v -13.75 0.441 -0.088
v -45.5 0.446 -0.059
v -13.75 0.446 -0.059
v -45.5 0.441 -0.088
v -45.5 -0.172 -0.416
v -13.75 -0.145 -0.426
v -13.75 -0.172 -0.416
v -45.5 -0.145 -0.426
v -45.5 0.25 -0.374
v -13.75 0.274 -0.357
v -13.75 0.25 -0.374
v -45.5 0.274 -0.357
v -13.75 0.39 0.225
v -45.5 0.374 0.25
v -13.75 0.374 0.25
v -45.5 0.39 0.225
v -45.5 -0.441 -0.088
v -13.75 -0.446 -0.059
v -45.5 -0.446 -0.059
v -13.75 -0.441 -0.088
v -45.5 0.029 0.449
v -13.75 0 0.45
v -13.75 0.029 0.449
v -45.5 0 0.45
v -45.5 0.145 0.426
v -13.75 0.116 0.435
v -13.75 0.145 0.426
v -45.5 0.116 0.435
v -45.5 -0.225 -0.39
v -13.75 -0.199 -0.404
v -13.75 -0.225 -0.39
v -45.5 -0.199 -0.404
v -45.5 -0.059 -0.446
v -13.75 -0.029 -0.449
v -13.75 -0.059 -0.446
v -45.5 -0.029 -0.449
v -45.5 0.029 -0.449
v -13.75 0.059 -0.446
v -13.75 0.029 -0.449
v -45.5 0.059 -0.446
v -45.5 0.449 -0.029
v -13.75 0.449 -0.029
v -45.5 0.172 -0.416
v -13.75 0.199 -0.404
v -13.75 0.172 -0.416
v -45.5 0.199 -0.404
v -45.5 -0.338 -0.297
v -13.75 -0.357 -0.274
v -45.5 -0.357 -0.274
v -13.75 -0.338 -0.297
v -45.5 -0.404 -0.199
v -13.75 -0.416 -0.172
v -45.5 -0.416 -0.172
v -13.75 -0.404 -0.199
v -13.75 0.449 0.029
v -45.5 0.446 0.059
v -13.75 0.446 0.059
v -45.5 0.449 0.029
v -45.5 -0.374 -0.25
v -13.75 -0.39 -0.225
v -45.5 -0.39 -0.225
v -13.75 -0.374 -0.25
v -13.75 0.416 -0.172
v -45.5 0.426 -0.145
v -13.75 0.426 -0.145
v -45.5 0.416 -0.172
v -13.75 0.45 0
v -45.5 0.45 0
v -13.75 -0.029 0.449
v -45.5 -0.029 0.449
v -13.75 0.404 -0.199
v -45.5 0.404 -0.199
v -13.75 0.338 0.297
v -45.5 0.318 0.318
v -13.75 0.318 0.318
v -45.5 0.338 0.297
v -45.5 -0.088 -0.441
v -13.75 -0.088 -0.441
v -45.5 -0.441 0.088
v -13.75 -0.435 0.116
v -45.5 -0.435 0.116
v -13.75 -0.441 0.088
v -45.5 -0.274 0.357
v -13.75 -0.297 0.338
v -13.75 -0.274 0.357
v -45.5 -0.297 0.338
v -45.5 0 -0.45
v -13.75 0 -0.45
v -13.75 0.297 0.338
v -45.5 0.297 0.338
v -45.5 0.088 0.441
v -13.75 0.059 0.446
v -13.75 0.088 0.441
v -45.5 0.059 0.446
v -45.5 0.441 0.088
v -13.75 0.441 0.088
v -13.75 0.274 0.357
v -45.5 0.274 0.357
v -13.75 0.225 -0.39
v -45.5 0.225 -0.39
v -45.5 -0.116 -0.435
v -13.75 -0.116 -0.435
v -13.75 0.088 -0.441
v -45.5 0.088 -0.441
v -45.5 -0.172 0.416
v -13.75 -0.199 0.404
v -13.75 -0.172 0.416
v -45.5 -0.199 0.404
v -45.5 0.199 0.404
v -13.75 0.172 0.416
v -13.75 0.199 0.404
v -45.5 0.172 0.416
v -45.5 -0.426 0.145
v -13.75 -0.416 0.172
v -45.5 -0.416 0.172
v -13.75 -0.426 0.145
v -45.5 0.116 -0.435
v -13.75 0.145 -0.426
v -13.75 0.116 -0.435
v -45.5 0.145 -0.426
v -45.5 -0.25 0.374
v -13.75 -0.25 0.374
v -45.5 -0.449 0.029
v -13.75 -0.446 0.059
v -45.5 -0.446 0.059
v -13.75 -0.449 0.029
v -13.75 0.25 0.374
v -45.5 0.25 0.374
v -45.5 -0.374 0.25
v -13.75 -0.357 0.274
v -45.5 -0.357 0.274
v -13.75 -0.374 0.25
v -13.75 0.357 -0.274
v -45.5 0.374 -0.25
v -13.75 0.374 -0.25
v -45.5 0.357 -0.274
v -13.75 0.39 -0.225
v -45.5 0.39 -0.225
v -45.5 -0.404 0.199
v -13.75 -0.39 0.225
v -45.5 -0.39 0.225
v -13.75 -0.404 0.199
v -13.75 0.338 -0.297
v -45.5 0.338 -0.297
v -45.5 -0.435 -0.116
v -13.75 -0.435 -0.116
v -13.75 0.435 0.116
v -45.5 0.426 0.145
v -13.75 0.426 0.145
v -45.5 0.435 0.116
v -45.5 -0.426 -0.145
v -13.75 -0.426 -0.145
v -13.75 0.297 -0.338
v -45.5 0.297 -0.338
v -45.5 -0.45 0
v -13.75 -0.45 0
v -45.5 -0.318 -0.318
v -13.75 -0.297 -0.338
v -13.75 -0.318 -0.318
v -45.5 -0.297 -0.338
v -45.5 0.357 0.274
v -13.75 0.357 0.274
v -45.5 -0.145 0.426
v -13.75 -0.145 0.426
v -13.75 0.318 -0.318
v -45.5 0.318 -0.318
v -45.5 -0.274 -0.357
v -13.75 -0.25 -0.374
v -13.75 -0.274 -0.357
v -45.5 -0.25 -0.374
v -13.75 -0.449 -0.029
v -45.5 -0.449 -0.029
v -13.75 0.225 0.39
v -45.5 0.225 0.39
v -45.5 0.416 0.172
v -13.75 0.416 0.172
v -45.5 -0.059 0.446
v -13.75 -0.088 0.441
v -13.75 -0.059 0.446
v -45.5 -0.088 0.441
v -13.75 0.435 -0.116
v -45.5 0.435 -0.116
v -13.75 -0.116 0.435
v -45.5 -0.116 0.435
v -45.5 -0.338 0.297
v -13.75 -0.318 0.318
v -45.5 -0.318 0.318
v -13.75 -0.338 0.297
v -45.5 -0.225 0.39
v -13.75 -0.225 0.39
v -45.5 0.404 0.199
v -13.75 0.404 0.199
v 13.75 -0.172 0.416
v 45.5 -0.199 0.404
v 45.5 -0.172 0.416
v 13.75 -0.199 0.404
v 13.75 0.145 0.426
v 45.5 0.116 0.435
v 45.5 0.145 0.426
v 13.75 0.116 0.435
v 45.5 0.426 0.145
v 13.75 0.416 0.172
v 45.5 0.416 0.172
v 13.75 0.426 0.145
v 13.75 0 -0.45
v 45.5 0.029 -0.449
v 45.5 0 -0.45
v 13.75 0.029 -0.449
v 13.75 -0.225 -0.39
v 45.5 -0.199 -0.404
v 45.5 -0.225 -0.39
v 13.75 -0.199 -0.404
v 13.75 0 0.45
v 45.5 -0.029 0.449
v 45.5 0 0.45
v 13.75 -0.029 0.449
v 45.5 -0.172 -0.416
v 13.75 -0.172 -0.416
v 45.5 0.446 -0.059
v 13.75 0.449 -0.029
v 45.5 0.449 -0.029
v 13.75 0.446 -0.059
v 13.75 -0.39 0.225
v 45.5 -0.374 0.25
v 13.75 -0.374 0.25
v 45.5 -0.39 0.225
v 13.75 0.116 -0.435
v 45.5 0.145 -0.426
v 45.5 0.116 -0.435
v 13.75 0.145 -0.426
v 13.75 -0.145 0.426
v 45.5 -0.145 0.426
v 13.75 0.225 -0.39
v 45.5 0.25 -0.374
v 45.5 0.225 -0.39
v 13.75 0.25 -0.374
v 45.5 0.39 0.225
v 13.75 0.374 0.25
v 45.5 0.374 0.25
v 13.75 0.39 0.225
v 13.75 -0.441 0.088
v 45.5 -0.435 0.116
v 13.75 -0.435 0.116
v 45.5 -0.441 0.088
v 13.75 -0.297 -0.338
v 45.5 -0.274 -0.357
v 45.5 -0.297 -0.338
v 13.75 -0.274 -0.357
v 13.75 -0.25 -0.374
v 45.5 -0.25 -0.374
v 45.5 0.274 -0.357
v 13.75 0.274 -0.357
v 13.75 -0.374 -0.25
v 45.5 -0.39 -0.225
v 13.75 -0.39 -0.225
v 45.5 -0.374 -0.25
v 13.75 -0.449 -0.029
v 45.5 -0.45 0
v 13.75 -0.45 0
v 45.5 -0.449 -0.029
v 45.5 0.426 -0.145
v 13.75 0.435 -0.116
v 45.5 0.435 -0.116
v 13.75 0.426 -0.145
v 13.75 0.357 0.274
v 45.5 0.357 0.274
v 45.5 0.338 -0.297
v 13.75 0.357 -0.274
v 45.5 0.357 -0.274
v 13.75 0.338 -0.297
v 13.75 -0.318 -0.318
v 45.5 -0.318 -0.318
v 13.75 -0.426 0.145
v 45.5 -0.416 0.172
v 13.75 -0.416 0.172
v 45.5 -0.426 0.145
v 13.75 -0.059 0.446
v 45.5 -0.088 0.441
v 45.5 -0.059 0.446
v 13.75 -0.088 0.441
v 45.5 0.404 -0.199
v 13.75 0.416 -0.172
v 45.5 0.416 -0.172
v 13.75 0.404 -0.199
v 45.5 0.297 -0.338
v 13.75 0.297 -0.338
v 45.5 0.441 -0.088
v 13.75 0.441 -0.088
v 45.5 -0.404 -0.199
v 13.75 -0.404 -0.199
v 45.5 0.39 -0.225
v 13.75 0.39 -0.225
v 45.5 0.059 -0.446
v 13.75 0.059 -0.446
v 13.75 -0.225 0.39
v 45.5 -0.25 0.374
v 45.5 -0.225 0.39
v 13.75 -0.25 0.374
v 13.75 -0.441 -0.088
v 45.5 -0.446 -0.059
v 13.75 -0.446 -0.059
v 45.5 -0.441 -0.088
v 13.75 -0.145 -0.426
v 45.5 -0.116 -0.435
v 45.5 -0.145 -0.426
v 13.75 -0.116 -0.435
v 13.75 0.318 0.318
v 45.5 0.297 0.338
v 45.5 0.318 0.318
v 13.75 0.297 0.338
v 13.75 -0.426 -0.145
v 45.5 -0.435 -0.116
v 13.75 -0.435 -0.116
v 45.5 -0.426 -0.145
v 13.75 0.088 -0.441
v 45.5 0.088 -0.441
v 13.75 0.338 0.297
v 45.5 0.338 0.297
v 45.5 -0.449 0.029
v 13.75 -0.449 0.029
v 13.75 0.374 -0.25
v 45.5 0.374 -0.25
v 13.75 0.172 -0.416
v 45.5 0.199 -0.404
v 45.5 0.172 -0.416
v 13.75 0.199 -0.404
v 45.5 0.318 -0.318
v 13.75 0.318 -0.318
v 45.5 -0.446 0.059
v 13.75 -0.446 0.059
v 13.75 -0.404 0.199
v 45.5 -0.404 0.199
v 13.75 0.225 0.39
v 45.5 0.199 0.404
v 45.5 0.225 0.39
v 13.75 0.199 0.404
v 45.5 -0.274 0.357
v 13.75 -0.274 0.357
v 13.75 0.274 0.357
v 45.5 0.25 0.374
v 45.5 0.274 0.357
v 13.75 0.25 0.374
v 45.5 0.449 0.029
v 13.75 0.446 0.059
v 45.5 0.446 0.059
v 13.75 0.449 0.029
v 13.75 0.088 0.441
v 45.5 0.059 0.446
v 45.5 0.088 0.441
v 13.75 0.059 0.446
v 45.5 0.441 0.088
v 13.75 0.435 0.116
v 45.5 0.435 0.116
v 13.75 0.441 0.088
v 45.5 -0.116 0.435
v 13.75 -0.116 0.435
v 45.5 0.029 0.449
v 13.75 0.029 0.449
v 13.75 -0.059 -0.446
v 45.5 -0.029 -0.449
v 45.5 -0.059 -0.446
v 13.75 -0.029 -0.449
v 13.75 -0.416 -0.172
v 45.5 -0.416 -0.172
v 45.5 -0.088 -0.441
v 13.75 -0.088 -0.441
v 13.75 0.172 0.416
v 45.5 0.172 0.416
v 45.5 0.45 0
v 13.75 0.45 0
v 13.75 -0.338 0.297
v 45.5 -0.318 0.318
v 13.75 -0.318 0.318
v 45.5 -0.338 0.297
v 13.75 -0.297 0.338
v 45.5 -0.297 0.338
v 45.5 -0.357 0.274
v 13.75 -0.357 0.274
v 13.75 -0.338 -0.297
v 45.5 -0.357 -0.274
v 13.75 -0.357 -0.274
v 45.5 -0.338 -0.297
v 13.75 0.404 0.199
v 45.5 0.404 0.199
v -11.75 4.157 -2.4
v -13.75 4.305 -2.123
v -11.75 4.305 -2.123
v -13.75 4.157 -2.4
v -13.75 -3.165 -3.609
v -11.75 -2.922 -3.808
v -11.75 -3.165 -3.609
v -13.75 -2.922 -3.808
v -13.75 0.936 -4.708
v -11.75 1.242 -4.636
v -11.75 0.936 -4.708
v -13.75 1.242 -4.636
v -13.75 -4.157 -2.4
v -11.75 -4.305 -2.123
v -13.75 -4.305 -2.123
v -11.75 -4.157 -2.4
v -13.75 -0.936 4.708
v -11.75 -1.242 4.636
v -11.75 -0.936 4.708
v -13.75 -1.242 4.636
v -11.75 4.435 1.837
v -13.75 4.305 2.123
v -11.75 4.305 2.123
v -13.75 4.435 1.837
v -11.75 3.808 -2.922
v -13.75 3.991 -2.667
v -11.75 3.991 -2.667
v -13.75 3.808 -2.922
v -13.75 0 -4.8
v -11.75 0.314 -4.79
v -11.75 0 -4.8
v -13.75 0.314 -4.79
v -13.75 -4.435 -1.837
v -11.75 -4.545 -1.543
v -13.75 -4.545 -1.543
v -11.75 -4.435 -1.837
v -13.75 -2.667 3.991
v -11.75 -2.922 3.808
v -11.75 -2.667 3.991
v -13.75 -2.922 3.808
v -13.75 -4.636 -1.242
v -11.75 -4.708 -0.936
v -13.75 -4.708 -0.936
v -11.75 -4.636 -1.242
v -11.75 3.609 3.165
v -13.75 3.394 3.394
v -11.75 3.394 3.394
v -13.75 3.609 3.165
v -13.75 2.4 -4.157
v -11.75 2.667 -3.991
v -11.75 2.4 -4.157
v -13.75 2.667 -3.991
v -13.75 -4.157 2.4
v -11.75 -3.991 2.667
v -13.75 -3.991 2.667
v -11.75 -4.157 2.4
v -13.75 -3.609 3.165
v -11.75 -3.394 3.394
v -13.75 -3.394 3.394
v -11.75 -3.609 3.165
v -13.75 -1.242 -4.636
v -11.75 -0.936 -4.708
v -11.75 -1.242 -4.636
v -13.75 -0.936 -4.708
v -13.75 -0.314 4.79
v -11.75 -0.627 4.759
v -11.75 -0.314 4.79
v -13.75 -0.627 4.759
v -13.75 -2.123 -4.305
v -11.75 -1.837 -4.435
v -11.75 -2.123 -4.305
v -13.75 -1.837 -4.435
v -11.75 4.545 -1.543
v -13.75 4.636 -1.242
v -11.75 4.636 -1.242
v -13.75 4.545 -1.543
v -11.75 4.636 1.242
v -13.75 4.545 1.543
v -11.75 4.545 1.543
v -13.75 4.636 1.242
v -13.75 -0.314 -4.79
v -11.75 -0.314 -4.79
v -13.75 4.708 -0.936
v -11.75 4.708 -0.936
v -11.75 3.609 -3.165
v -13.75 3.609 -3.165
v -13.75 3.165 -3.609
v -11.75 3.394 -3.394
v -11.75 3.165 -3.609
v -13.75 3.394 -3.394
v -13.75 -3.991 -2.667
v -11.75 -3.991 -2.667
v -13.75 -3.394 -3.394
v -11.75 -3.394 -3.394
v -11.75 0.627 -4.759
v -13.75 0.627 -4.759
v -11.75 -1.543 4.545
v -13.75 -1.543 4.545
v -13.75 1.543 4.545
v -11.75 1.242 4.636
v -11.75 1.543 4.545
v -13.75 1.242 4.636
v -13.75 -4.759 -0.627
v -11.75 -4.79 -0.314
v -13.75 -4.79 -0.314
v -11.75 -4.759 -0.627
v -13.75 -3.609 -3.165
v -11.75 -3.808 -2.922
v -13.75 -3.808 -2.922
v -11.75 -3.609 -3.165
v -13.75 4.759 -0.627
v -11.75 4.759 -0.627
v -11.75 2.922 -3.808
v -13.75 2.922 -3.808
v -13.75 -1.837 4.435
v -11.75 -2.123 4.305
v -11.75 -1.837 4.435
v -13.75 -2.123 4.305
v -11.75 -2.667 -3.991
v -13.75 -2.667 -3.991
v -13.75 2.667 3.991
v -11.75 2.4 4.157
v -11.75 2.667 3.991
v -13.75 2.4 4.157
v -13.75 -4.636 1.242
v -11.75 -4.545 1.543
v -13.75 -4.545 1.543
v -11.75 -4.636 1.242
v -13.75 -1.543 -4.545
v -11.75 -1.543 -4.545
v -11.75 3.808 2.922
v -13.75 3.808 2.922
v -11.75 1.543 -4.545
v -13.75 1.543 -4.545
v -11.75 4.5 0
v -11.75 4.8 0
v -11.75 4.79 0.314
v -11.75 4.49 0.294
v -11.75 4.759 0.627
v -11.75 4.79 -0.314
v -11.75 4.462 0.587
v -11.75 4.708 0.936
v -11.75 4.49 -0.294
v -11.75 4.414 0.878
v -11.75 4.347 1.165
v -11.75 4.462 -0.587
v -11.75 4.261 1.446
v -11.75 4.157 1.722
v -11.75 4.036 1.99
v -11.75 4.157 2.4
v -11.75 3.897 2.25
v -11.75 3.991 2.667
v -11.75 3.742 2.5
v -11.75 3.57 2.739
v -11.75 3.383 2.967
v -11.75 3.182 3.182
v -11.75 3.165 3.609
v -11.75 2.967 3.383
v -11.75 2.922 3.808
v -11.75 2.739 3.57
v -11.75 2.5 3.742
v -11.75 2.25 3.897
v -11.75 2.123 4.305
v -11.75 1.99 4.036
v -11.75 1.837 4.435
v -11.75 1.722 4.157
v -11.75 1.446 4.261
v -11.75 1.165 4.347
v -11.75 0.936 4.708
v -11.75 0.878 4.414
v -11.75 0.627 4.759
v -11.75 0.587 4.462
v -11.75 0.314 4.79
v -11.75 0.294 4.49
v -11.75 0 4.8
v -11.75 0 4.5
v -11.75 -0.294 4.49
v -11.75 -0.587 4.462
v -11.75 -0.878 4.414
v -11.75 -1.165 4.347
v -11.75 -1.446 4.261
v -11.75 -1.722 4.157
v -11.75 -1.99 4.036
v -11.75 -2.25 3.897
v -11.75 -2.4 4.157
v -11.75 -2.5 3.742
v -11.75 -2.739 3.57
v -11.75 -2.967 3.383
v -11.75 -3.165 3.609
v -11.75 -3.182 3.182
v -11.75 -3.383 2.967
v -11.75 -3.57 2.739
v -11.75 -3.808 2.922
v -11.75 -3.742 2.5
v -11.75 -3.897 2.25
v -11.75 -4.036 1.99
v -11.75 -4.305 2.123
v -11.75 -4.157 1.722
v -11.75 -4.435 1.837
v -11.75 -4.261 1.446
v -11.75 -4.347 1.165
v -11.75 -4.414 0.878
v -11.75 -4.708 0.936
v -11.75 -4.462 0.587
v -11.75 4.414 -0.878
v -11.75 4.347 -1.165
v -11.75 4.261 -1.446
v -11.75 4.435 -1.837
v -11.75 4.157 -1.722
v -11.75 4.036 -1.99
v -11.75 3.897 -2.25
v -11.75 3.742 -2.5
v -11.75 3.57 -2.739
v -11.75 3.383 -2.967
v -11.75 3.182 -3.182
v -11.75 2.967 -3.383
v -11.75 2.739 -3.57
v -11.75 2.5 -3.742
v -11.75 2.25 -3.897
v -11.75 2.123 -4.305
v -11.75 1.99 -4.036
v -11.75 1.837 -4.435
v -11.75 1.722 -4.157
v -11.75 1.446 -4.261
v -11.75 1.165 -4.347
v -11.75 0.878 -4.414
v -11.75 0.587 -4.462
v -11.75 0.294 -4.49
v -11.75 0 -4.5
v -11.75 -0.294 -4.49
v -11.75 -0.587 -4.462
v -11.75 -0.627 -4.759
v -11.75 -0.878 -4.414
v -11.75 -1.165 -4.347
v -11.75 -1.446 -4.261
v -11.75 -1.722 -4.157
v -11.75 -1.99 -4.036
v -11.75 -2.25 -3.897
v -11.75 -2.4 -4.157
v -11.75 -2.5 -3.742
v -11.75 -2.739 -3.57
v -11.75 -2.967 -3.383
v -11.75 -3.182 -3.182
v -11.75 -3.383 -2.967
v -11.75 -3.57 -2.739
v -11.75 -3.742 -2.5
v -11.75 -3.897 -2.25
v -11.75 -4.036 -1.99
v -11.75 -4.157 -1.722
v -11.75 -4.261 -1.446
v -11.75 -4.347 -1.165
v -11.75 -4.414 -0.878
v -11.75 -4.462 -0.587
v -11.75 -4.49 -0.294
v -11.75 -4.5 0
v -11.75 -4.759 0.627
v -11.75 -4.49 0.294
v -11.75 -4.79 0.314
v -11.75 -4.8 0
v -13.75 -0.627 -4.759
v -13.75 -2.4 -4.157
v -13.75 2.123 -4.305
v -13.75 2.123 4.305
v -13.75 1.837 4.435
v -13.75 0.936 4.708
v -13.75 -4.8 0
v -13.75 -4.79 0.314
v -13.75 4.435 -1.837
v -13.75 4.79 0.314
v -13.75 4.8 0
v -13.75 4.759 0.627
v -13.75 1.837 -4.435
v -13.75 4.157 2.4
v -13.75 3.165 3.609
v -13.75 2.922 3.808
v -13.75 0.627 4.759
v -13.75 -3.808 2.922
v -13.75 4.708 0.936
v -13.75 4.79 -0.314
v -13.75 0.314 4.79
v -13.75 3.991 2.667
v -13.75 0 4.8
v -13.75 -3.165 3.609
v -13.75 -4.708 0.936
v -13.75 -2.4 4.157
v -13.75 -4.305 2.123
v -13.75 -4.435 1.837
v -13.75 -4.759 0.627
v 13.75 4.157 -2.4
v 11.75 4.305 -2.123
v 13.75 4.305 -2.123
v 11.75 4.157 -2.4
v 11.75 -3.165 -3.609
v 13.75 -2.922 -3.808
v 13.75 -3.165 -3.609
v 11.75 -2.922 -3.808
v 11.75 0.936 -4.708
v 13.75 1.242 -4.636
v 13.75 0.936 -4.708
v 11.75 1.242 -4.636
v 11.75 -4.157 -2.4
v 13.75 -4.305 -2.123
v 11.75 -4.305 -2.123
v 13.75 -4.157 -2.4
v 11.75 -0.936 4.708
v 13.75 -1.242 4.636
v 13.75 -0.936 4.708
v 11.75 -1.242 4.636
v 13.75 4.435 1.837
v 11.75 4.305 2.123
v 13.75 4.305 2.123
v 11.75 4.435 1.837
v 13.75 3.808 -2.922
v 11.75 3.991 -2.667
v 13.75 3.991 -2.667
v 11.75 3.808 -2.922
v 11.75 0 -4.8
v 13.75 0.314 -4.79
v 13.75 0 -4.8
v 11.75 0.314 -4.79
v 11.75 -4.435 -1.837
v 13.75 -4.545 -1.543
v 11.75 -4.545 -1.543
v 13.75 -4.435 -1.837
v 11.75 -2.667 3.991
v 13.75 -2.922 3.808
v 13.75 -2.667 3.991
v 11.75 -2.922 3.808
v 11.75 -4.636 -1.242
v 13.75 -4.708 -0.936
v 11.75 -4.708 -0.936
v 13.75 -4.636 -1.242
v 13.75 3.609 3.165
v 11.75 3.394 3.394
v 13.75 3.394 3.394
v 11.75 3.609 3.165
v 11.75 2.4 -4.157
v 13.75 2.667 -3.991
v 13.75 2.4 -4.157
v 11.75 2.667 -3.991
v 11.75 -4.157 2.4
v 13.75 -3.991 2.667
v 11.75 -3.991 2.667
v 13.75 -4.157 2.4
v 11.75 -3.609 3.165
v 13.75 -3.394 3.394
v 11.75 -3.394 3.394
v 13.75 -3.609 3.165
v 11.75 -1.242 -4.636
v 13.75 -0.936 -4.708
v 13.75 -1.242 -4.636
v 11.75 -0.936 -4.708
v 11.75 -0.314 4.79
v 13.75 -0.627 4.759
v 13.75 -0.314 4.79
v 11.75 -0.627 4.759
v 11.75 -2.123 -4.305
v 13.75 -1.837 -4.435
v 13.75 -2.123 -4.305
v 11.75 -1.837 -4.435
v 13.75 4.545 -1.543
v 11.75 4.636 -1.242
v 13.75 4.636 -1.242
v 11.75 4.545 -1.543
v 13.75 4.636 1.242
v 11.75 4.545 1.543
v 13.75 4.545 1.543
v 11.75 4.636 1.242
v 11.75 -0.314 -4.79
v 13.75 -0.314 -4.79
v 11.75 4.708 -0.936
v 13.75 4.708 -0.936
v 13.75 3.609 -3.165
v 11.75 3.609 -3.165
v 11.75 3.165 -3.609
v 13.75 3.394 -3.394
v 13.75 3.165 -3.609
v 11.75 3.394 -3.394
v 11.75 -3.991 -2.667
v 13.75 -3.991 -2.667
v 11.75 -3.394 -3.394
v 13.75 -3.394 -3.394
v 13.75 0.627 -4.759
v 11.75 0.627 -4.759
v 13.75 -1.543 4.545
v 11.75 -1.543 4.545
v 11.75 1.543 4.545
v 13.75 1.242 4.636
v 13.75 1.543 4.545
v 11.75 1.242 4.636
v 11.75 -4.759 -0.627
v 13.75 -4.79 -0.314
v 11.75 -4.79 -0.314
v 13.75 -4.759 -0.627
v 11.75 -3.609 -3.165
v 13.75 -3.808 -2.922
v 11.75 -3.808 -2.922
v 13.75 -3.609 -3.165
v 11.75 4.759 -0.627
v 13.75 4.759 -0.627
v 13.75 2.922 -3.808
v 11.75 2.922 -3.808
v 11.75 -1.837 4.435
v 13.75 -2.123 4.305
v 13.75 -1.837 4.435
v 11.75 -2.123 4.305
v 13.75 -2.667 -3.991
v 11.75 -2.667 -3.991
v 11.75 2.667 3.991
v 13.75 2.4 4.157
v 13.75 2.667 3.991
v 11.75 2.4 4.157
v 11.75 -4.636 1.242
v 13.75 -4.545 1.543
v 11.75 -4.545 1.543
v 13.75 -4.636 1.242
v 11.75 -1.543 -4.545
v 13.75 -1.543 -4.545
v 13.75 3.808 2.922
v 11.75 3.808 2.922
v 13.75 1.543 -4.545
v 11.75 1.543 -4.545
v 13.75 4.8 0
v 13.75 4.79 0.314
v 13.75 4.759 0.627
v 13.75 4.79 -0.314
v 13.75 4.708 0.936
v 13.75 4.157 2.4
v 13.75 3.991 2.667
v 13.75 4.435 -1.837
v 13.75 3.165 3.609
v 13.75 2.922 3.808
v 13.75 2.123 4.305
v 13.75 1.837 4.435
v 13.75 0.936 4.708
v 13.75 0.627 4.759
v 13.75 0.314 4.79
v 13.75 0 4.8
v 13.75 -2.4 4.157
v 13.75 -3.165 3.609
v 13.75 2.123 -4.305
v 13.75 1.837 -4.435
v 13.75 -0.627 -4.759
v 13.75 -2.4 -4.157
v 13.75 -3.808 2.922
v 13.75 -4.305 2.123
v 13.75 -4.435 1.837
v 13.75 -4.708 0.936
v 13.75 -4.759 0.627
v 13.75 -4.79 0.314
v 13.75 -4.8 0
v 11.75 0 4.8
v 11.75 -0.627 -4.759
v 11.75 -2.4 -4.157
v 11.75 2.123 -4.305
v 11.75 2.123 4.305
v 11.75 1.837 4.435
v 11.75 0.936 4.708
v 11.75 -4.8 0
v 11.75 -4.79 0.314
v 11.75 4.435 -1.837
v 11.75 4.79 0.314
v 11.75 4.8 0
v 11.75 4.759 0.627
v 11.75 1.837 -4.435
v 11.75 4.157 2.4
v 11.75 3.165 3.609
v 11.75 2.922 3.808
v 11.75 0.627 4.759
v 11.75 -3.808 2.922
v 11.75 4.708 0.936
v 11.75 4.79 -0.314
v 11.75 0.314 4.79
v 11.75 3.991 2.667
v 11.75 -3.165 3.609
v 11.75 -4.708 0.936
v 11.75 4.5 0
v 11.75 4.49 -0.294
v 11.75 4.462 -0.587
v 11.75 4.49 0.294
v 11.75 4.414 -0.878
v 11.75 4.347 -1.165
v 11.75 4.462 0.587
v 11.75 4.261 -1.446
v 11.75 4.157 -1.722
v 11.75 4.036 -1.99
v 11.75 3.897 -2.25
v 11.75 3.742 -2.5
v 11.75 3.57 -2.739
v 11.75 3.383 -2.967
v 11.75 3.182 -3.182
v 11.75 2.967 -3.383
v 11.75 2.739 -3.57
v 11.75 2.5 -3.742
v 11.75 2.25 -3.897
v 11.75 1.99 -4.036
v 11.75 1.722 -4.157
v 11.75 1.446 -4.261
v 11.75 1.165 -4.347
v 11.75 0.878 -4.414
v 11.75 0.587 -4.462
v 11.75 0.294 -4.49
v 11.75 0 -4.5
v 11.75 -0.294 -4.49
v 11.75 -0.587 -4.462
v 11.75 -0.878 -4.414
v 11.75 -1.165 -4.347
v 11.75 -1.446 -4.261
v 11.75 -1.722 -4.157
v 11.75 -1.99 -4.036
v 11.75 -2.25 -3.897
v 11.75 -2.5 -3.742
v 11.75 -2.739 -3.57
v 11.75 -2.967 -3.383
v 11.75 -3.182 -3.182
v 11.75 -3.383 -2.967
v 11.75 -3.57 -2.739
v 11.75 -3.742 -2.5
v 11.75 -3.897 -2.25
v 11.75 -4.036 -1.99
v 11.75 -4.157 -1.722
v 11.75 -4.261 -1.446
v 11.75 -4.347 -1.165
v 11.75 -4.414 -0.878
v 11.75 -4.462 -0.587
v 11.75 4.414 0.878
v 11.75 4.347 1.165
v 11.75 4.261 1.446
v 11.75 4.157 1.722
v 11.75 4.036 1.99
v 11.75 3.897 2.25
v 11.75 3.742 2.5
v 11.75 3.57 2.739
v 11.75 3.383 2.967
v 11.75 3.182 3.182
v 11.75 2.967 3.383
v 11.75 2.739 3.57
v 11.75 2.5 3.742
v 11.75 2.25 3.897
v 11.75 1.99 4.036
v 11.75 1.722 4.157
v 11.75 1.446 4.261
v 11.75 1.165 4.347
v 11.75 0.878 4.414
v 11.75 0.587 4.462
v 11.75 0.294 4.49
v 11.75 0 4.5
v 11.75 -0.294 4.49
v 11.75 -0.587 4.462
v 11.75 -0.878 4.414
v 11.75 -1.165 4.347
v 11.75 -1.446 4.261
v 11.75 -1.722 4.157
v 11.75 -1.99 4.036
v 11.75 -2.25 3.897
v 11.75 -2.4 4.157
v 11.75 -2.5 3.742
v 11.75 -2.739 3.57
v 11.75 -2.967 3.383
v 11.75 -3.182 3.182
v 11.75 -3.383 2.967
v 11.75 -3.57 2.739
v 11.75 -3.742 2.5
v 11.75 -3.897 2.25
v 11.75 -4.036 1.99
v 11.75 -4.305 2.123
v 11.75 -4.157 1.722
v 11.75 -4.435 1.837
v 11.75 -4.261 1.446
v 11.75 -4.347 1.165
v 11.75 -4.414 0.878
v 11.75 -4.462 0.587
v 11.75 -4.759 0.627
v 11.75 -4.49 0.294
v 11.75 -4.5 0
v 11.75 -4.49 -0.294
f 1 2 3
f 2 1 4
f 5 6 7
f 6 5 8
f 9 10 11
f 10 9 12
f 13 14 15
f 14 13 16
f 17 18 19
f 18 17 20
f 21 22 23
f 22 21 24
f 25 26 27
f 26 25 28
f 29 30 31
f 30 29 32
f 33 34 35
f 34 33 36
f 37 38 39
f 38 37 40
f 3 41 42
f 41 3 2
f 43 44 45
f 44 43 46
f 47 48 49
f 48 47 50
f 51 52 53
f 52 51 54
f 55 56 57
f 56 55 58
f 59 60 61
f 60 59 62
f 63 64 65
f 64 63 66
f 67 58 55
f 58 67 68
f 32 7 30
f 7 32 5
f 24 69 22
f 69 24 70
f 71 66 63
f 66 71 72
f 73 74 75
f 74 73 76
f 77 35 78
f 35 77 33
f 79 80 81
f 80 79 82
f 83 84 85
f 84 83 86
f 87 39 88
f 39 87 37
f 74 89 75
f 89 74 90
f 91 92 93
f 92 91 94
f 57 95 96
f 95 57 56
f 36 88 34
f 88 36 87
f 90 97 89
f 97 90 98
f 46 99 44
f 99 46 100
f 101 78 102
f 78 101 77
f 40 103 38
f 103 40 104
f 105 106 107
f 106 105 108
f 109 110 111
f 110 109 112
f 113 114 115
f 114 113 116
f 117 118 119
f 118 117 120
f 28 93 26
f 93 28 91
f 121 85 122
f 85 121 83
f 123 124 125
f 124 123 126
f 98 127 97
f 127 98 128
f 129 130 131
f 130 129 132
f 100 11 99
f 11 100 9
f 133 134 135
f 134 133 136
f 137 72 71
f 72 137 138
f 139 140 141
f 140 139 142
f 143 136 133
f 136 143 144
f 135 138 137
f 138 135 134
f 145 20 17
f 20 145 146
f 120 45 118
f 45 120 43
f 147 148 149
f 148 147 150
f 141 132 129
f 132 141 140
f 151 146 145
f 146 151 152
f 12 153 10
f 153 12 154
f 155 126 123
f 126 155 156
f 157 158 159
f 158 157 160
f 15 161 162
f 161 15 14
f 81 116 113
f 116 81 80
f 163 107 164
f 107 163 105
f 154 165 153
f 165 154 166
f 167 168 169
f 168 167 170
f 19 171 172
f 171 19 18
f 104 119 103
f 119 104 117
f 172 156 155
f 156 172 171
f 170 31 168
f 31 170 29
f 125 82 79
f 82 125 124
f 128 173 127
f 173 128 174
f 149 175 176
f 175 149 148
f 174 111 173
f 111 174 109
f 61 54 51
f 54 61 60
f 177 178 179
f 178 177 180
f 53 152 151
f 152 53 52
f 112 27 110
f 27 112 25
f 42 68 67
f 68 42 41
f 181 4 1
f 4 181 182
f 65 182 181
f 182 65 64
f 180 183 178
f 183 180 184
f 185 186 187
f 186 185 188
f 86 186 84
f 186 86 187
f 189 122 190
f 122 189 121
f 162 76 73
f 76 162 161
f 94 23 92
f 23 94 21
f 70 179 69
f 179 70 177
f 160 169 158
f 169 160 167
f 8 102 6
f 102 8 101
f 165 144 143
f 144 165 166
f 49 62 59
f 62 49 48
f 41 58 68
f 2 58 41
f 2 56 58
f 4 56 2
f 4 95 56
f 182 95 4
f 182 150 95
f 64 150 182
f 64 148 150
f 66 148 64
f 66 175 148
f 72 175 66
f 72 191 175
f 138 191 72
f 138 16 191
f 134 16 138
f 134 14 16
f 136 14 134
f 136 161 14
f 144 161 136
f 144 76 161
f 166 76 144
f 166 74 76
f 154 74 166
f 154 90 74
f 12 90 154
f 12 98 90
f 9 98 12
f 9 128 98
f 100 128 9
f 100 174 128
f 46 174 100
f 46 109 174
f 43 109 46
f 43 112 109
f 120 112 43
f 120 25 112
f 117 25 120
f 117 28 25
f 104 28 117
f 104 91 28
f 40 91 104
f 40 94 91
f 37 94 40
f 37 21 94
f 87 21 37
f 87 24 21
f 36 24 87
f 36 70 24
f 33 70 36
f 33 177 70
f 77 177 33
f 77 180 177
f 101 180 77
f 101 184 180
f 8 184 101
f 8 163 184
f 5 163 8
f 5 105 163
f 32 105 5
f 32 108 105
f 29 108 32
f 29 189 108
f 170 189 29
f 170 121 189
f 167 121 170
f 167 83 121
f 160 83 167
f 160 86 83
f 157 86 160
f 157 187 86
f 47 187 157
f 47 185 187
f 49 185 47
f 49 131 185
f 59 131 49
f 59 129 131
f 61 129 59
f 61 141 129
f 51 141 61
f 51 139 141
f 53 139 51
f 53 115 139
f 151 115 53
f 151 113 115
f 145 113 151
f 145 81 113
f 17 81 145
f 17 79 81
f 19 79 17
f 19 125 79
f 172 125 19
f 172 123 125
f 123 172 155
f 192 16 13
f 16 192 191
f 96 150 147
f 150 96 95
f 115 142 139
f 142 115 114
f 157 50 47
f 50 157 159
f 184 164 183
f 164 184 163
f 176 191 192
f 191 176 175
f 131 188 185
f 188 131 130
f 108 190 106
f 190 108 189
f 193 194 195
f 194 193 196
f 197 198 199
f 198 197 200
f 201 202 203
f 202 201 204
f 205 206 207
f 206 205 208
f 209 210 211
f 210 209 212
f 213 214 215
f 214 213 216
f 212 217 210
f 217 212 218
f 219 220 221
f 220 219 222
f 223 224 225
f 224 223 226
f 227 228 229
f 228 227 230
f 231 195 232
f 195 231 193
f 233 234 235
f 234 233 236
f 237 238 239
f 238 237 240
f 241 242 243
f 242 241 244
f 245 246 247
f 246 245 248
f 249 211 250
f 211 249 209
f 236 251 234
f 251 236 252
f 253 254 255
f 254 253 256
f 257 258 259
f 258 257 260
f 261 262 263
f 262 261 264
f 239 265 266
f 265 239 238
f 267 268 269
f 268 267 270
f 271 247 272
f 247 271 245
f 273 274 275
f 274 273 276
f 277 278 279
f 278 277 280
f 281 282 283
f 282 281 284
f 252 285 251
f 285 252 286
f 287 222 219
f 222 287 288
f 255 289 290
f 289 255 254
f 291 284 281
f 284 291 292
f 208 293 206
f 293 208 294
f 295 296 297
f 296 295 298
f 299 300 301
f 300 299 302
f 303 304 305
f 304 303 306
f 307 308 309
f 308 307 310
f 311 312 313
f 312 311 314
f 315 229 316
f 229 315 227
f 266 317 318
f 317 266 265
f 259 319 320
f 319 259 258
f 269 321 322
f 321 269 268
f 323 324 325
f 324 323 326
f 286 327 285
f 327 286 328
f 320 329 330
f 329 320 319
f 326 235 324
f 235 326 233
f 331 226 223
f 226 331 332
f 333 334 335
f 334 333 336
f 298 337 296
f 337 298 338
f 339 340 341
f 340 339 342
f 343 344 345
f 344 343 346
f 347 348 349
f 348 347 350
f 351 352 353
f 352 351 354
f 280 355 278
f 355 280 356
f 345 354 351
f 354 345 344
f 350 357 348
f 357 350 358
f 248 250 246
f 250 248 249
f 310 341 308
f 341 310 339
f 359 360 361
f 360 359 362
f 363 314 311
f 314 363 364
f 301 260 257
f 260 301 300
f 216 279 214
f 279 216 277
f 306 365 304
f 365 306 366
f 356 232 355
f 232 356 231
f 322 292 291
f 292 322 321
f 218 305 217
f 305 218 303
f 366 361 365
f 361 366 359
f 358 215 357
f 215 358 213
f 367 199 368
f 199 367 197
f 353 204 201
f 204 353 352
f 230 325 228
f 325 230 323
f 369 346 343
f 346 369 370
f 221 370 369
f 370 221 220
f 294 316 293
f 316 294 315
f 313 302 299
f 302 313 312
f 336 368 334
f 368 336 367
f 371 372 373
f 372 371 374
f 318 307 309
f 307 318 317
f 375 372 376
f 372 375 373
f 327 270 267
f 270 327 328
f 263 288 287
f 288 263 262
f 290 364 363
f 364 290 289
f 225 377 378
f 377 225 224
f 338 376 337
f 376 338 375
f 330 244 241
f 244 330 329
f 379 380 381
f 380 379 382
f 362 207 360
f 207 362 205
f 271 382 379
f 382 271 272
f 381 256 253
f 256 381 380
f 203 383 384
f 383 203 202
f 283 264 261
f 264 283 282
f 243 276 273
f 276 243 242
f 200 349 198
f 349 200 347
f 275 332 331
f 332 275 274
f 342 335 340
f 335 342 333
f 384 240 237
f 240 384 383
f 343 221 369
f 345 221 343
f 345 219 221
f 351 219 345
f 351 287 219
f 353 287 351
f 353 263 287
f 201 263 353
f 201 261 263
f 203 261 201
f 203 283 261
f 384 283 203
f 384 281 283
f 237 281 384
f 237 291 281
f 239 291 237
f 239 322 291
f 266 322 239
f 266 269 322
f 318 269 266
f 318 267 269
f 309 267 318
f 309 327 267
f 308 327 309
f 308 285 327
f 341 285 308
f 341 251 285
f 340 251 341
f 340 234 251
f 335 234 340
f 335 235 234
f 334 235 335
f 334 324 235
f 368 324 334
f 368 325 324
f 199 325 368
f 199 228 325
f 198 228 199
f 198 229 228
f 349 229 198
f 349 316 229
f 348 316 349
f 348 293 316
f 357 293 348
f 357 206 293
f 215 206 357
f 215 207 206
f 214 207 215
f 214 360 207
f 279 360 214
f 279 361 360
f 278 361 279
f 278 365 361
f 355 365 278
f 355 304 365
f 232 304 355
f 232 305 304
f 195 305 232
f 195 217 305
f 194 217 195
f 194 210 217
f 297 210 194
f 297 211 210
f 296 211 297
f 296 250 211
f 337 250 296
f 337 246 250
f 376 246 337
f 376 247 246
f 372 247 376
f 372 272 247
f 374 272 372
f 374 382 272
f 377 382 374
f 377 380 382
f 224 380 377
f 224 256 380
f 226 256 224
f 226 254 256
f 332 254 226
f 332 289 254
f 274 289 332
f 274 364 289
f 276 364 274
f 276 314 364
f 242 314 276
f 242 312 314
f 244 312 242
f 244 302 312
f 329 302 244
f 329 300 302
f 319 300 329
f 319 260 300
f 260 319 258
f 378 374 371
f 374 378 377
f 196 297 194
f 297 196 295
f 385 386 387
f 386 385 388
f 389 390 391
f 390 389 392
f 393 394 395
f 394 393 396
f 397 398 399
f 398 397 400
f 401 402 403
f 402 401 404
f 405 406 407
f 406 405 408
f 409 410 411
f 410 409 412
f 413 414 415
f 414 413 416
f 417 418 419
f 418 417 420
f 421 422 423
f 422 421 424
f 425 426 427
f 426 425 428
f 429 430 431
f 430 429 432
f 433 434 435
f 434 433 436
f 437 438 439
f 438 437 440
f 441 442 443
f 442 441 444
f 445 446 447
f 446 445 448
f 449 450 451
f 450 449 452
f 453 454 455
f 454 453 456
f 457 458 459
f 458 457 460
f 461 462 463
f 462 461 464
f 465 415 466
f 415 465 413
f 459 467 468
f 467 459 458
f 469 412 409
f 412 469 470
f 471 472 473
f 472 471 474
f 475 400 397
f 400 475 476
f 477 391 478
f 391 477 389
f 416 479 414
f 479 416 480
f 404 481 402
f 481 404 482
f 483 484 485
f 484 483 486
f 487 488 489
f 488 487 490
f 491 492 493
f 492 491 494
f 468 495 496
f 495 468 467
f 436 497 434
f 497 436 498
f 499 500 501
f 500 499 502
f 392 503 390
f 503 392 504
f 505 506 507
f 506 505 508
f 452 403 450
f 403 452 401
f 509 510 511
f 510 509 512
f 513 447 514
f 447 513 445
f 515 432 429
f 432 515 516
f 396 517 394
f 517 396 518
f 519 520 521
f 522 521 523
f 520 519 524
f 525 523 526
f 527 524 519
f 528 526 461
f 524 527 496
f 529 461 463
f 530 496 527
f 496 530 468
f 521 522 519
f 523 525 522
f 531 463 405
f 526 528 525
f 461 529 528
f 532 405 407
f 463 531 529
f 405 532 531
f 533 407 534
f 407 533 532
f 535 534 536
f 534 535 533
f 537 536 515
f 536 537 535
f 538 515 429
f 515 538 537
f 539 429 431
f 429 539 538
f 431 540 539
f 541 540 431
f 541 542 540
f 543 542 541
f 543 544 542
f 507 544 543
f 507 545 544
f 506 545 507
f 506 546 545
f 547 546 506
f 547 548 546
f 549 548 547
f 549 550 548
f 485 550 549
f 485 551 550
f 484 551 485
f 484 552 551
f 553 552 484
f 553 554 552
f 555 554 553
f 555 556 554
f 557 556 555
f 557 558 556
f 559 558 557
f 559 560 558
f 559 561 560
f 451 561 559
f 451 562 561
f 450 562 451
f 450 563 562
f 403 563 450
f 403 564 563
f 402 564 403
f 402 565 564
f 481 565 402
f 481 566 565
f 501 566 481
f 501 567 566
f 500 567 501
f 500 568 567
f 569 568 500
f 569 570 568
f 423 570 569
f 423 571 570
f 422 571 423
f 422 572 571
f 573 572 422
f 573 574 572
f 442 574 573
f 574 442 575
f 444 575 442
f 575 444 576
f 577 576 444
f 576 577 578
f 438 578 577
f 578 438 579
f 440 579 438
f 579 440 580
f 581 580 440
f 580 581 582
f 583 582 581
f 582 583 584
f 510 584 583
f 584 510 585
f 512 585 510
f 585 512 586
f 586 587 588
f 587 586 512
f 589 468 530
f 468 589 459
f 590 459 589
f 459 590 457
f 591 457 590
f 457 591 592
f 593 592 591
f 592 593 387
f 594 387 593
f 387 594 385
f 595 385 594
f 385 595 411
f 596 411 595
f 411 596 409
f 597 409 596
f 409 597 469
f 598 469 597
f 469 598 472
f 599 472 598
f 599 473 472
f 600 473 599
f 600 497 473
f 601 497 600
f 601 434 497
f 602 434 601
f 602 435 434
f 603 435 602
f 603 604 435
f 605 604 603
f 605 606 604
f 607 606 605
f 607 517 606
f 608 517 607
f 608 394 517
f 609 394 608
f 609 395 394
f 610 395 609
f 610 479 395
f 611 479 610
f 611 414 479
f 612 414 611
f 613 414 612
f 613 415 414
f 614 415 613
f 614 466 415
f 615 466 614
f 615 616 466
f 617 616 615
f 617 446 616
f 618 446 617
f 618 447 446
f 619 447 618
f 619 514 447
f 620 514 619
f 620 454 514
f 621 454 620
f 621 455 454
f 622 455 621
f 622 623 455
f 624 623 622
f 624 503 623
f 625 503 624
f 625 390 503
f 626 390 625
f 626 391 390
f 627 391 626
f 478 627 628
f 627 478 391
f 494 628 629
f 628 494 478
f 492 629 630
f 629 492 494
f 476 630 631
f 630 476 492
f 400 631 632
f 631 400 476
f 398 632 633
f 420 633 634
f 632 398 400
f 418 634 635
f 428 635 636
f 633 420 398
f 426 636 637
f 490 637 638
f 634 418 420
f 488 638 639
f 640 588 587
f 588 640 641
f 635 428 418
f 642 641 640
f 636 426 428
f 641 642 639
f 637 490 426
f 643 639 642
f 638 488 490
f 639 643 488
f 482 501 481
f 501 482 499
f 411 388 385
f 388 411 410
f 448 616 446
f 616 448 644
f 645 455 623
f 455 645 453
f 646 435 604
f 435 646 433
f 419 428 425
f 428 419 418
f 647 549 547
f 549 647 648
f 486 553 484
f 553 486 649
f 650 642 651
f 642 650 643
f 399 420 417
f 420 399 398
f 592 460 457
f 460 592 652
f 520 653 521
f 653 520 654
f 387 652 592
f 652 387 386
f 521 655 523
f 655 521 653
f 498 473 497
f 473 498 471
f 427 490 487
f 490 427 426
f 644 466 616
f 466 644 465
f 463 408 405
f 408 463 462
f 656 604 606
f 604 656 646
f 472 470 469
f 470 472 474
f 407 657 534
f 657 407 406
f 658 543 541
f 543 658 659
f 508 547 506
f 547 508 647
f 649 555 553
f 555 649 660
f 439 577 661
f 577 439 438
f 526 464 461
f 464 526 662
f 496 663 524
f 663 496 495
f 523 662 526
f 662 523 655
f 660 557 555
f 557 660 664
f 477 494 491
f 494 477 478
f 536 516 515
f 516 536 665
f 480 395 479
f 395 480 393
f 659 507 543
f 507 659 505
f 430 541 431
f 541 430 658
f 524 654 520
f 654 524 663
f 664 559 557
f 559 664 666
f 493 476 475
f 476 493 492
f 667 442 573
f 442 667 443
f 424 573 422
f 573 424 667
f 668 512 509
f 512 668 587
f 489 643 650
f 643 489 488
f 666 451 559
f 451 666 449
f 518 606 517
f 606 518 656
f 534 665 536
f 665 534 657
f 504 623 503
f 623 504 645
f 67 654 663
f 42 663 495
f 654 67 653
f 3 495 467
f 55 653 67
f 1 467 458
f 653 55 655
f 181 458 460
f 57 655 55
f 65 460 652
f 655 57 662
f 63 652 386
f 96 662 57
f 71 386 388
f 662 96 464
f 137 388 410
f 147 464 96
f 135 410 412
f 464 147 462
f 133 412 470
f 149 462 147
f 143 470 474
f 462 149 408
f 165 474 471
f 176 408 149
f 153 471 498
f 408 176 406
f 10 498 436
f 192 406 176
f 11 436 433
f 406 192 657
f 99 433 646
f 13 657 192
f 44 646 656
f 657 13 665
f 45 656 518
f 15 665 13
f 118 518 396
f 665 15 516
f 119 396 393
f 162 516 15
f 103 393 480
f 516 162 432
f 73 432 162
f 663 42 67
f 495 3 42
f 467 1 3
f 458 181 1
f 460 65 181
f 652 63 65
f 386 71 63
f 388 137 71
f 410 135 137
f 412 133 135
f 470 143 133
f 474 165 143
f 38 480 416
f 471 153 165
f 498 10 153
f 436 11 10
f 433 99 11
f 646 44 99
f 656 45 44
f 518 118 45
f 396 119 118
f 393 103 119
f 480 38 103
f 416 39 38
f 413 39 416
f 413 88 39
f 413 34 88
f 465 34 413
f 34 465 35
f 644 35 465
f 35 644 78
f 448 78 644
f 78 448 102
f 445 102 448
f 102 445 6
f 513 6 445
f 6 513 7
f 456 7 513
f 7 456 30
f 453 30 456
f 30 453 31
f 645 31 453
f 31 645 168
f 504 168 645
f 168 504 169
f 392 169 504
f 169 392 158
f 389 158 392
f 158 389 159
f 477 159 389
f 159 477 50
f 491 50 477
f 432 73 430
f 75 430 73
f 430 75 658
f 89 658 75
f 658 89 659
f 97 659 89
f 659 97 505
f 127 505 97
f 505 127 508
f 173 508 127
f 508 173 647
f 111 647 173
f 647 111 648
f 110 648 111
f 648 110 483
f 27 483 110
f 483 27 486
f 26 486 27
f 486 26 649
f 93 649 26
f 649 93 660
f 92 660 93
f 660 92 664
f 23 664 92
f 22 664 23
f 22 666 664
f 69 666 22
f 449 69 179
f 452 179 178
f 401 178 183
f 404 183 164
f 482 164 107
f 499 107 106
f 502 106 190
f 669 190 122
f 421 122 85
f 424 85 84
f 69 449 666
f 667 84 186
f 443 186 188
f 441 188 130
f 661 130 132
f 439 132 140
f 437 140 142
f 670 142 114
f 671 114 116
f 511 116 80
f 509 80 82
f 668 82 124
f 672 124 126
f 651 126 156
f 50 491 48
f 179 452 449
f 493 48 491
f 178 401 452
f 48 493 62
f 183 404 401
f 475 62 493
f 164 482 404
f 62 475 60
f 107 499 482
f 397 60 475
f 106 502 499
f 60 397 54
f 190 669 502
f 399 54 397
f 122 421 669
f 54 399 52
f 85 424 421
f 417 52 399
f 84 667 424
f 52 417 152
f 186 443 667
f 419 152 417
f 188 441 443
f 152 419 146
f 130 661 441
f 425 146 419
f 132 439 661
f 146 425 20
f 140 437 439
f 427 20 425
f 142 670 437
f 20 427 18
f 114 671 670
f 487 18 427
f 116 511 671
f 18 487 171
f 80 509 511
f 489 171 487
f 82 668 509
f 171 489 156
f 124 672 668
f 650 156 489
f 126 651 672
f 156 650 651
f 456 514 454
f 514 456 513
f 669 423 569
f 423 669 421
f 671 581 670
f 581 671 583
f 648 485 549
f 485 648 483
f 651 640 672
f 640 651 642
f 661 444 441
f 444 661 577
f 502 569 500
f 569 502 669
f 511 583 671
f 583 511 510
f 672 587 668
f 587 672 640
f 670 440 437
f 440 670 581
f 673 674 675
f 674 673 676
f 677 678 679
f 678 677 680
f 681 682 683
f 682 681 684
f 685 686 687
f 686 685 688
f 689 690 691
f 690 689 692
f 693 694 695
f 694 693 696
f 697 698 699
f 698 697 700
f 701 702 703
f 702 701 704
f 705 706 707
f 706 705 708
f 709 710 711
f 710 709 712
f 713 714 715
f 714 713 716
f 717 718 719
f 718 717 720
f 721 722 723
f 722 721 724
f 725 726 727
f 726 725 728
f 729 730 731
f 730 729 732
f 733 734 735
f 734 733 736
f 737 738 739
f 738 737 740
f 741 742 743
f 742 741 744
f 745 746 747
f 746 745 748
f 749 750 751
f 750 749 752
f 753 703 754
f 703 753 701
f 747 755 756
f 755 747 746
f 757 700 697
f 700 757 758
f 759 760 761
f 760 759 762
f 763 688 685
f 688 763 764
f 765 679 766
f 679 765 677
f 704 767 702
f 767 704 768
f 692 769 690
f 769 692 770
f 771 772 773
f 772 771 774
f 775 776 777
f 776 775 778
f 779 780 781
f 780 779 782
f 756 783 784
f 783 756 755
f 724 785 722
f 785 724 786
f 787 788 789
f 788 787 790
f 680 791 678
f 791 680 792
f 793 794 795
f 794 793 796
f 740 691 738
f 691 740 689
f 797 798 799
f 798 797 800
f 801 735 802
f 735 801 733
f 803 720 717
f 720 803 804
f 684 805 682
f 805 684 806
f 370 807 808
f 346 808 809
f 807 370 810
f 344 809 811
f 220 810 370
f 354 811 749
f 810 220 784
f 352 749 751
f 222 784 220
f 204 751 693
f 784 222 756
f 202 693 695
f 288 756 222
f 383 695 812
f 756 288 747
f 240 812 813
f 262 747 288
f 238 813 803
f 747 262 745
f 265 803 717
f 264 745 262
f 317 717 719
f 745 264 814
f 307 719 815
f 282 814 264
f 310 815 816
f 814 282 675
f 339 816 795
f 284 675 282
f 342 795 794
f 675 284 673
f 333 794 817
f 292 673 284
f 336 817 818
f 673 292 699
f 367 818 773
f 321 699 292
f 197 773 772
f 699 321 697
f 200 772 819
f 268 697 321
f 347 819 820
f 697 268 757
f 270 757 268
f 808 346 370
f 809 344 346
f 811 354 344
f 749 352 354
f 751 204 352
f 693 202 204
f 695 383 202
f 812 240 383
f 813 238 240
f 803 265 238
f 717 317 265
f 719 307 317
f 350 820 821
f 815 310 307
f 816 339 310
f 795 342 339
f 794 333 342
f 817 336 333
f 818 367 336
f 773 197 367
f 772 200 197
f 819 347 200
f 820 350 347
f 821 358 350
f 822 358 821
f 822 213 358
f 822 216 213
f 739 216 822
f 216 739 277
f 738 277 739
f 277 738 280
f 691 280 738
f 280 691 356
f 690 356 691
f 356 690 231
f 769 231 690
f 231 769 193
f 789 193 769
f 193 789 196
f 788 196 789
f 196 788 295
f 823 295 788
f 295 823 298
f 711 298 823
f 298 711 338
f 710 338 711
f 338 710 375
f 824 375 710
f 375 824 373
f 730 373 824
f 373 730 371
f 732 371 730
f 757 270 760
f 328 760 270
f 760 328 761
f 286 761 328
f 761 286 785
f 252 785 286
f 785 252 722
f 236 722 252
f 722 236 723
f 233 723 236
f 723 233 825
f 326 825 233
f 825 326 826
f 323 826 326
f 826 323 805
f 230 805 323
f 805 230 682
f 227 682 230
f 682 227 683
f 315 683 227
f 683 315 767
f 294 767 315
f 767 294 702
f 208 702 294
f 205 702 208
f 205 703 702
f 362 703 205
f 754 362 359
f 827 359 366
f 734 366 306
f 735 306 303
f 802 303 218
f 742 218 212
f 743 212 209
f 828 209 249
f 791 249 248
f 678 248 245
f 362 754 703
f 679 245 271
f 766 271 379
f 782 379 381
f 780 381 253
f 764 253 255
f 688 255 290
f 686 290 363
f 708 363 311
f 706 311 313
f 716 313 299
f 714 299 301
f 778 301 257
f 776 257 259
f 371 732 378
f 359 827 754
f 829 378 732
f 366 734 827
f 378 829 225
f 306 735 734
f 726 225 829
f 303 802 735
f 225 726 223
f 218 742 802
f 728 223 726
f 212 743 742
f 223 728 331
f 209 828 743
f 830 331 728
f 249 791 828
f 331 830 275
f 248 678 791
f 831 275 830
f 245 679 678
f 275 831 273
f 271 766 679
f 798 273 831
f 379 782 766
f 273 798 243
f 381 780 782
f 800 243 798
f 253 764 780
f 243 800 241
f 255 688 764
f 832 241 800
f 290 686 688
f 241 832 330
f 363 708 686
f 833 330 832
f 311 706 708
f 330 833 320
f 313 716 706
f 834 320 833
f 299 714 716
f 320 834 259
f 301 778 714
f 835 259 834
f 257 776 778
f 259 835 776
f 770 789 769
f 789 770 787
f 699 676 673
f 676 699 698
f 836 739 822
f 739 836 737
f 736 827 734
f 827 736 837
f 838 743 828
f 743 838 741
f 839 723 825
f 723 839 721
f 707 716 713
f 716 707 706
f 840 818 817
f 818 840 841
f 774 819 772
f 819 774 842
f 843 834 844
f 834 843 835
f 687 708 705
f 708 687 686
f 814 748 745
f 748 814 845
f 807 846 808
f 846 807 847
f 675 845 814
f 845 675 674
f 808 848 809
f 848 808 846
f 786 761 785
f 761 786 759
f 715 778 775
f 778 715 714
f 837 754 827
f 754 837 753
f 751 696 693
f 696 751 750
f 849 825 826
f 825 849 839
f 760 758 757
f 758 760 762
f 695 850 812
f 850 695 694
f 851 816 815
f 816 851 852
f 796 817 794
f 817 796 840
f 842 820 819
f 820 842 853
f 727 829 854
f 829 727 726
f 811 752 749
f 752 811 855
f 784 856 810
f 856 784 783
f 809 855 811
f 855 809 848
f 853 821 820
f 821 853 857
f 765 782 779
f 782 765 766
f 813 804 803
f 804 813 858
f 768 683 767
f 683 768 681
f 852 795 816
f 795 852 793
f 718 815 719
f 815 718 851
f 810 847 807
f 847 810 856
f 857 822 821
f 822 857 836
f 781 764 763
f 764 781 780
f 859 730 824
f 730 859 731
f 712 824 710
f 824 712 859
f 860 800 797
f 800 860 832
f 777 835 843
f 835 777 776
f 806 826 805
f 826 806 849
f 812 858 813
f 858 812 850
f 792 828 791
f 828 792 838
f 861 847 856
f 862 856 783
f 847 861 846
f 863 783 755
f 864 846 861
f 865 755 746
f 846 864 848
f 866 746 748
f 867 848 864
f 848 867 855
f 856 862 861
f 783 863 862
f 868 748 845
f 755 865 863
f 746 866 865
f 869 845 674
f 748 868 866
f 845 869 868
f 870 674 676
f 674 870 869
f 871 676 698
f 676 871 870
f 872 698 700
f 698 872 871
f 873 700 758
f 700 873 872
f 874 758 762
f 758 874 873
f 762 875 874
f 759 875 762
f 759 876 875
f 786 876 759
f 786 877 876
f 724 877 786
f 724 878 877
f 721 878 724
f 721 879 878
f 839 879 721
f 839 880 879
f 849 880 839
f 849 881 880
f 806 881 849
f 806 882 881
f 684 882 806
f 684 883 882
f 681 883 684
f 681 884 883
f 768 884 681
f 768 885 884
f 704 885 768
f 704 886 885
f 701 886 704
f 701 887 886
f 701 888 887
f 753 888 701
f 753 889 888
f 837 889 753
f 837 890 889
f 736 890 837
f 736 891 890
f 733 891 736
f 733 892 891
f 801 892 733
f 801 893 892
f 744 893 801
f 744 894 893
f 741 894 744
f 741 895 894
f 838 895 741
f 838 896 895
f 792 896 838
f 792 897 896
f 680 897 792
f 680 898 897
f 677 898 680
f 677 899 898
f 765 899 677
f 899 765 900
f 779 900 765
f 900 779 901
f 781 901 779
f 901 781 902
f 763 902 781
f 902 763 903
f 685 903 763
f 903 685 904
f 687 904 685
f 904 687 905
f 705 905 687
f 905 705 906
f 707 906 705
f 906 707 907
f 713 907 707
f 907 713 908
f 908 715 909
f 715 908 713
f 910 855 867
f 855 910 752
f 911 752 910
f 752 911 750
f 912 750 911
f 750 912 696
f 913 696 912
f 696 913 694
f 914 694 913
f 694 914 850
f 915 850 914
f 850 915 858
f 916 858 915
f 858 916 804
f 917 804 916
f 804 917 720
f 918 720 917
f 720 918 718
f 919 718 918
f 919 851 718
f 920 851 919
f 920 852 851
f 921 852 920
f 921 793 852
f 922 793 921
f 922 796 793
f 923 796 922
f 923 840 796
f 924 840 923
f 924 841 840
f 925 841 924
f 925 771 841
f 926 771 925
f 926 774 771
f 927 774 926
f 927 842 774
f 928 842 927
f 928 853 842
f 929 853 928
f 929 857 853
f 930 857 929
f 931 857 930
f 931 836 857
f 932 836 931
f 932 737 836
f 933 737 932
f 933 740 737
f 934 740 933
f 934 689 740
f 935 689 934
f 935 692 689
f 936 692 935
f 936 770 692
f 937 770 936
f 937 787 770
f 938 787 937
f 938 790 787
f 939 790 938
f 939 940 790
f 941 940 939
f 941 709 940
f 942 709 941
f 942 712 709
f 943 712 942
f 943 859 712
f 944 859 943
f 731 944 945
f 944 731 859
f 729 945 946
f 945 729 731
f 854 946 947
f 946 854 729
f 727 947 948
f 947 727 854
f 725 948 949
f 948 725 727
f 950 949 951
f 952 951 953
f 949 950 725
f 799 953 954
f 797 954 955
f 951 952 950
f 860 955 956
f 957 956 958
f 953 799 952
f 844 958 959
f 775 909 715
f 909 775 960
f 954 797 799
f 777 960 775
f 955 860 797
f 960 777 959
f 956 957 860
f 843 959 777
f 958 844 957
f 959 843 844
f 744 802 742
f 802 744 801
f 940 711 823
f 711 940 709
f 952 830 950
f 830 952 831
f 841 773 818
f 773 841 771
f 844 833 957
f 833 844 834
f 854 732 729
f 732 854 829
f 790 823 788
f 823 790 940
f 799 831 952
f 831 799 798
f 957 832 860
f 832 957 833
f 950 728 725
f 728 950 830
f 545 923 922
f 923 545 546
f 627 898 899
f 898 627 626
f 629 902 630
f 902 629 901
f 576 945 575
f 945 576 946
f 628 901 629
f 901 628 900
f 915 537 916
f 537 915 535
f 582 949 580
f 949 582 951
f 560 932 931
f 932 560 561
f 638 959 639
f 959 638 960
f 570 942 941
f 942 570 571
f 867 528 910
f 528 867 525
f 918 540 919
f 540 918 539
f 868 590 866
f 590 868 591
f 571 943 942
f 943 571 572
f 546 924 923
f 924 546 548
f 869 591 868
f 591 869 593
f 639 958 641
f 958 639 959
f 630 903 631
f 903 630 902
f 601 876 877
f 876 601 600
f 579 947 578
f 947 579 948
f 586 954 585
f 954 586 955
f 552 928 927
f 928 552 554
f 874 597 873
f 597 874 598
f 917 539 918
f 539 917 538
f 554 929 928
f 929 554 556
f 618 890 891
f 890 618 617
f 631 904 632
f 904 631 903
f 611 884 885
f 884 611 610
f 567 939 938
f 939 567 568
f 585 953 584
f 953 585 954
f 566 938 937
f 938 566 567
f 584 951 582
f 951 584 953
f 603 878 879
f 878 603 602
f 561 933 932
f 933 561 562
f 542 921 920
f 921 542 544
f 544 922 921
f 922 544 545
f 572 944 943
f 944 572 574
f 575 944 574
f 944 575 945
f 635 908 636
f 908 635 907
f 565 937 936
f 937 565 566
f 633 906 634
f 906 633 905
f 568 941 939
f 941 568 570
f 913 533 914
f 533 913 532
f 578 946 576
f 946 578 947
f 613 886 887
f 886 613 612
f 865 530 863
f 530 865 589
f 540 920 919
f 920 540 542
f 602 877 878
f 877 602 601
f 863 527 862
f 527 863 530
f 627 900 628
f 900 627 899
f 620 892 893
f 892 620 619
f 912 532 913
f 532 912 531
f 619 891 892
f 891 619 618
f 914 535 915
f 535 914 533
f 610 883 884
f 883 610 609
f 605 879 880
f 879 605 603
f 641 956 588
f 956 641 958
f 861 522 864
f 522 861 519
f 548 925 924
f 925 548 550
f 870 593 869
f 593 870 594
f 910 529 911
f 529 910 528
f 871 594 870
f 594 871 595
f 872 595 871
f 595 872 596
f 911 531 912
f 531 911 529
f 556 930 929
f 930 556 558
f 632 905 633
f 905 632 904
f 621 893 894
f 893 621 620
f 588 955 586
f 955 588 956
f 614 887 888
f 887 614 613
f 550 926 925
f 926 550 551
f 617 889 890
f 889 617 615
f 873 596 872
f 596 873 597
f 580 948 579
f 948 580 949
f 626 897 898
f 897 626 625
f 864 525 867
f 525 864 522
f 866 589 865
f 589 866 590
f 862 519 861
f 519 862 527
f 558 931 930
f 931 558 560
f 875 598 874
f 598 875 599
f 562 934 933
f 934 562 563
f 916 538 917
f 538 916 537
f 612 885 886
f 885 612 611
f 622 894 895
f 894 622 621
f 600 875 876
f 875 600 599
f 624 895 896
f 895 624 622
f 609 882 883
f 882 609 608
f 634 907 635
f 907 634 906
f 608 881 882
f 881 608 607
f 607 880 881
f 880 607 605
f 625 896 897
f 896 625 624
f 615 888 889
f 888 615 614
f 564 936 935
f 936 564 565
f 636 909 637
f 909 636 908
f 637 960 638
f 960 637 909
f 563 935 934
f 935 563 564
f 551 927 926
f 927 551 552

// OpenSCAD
$fn = 96;

// Resistor 5R6 3W vitreous enamel (axial leaded)
// Built along X axis and centered at origin for correct orthographic framing.
// Single connected solid (slight overlaps at joints). No text/labels.

// Approximate dimensions (mm) for 3W vitreous enamel style
body_len = 24.0;
body_dia = 9.0;

cap_len  = 2.0;     // metal end cap length each side
cap_dia  = 9.6;     // slightly larger than body

lead_dia = 0.9;
lead_len = 32.0;    // from each end cap outward

// Small overlaps to guarantee watertight union
overlap_ax = 0.25;  // axial overlap between adjacent parts
overlap_rd = 0.10;  // radial overlap (if needed)

module cyl_x(len, d, center=true){
    rotate([0,90,0]) cylinder(h=len, d=d, center=center);
}

module lead_wire(len=lead_len, dia=lead_dia){
    cyl_x(len=len, d=dia, center=true);
}

module end_cap(len=cap_len, dia=cap_dia){
    cyl_x(len=len, d=dia, center=true);
}

module body(len=body_len, dia=body_dia){
    // Slightly rounded ends via hull of two thin disks
    hull(){
        translate([-len/2 + 0.2, 0, 0]) cyl_x(len=0.4, d=dia, center=true);
        translate([ len/2 - 0.2, 0, 0]) cyl_x(len=0.4, d=dia, center=true);
    }
}

module resistor(){
    // Segment centers along X
    body_cx = 0;

    capL_cx = -(body_len/2 + cap_len/2 - overlap_ax);
    capR_cx =  (body_len/2 + cap_len/2 - overlap_ax);

    leadL_cx = -(body_len/2 + cap_len + lead_len/2 - 2*overlap_ax);
    leadR_cx =  (body_len/2 + cap_len + lead_len/2 - 2*overlap_ax);

    union(){
        // Leads
        translate([leadL_cx, 0, 0]) lead_wire();
        translate([leadR_cx, 0, 0]) lead_wire();

        // End caps
        translate([capL_cx, 0, 0]) end_cap();
        translate([capR_cx, 0, 0]) end_cap();

        // Body
        translate([body_cx, 0, 0]) body();
    }
}

resistor();
